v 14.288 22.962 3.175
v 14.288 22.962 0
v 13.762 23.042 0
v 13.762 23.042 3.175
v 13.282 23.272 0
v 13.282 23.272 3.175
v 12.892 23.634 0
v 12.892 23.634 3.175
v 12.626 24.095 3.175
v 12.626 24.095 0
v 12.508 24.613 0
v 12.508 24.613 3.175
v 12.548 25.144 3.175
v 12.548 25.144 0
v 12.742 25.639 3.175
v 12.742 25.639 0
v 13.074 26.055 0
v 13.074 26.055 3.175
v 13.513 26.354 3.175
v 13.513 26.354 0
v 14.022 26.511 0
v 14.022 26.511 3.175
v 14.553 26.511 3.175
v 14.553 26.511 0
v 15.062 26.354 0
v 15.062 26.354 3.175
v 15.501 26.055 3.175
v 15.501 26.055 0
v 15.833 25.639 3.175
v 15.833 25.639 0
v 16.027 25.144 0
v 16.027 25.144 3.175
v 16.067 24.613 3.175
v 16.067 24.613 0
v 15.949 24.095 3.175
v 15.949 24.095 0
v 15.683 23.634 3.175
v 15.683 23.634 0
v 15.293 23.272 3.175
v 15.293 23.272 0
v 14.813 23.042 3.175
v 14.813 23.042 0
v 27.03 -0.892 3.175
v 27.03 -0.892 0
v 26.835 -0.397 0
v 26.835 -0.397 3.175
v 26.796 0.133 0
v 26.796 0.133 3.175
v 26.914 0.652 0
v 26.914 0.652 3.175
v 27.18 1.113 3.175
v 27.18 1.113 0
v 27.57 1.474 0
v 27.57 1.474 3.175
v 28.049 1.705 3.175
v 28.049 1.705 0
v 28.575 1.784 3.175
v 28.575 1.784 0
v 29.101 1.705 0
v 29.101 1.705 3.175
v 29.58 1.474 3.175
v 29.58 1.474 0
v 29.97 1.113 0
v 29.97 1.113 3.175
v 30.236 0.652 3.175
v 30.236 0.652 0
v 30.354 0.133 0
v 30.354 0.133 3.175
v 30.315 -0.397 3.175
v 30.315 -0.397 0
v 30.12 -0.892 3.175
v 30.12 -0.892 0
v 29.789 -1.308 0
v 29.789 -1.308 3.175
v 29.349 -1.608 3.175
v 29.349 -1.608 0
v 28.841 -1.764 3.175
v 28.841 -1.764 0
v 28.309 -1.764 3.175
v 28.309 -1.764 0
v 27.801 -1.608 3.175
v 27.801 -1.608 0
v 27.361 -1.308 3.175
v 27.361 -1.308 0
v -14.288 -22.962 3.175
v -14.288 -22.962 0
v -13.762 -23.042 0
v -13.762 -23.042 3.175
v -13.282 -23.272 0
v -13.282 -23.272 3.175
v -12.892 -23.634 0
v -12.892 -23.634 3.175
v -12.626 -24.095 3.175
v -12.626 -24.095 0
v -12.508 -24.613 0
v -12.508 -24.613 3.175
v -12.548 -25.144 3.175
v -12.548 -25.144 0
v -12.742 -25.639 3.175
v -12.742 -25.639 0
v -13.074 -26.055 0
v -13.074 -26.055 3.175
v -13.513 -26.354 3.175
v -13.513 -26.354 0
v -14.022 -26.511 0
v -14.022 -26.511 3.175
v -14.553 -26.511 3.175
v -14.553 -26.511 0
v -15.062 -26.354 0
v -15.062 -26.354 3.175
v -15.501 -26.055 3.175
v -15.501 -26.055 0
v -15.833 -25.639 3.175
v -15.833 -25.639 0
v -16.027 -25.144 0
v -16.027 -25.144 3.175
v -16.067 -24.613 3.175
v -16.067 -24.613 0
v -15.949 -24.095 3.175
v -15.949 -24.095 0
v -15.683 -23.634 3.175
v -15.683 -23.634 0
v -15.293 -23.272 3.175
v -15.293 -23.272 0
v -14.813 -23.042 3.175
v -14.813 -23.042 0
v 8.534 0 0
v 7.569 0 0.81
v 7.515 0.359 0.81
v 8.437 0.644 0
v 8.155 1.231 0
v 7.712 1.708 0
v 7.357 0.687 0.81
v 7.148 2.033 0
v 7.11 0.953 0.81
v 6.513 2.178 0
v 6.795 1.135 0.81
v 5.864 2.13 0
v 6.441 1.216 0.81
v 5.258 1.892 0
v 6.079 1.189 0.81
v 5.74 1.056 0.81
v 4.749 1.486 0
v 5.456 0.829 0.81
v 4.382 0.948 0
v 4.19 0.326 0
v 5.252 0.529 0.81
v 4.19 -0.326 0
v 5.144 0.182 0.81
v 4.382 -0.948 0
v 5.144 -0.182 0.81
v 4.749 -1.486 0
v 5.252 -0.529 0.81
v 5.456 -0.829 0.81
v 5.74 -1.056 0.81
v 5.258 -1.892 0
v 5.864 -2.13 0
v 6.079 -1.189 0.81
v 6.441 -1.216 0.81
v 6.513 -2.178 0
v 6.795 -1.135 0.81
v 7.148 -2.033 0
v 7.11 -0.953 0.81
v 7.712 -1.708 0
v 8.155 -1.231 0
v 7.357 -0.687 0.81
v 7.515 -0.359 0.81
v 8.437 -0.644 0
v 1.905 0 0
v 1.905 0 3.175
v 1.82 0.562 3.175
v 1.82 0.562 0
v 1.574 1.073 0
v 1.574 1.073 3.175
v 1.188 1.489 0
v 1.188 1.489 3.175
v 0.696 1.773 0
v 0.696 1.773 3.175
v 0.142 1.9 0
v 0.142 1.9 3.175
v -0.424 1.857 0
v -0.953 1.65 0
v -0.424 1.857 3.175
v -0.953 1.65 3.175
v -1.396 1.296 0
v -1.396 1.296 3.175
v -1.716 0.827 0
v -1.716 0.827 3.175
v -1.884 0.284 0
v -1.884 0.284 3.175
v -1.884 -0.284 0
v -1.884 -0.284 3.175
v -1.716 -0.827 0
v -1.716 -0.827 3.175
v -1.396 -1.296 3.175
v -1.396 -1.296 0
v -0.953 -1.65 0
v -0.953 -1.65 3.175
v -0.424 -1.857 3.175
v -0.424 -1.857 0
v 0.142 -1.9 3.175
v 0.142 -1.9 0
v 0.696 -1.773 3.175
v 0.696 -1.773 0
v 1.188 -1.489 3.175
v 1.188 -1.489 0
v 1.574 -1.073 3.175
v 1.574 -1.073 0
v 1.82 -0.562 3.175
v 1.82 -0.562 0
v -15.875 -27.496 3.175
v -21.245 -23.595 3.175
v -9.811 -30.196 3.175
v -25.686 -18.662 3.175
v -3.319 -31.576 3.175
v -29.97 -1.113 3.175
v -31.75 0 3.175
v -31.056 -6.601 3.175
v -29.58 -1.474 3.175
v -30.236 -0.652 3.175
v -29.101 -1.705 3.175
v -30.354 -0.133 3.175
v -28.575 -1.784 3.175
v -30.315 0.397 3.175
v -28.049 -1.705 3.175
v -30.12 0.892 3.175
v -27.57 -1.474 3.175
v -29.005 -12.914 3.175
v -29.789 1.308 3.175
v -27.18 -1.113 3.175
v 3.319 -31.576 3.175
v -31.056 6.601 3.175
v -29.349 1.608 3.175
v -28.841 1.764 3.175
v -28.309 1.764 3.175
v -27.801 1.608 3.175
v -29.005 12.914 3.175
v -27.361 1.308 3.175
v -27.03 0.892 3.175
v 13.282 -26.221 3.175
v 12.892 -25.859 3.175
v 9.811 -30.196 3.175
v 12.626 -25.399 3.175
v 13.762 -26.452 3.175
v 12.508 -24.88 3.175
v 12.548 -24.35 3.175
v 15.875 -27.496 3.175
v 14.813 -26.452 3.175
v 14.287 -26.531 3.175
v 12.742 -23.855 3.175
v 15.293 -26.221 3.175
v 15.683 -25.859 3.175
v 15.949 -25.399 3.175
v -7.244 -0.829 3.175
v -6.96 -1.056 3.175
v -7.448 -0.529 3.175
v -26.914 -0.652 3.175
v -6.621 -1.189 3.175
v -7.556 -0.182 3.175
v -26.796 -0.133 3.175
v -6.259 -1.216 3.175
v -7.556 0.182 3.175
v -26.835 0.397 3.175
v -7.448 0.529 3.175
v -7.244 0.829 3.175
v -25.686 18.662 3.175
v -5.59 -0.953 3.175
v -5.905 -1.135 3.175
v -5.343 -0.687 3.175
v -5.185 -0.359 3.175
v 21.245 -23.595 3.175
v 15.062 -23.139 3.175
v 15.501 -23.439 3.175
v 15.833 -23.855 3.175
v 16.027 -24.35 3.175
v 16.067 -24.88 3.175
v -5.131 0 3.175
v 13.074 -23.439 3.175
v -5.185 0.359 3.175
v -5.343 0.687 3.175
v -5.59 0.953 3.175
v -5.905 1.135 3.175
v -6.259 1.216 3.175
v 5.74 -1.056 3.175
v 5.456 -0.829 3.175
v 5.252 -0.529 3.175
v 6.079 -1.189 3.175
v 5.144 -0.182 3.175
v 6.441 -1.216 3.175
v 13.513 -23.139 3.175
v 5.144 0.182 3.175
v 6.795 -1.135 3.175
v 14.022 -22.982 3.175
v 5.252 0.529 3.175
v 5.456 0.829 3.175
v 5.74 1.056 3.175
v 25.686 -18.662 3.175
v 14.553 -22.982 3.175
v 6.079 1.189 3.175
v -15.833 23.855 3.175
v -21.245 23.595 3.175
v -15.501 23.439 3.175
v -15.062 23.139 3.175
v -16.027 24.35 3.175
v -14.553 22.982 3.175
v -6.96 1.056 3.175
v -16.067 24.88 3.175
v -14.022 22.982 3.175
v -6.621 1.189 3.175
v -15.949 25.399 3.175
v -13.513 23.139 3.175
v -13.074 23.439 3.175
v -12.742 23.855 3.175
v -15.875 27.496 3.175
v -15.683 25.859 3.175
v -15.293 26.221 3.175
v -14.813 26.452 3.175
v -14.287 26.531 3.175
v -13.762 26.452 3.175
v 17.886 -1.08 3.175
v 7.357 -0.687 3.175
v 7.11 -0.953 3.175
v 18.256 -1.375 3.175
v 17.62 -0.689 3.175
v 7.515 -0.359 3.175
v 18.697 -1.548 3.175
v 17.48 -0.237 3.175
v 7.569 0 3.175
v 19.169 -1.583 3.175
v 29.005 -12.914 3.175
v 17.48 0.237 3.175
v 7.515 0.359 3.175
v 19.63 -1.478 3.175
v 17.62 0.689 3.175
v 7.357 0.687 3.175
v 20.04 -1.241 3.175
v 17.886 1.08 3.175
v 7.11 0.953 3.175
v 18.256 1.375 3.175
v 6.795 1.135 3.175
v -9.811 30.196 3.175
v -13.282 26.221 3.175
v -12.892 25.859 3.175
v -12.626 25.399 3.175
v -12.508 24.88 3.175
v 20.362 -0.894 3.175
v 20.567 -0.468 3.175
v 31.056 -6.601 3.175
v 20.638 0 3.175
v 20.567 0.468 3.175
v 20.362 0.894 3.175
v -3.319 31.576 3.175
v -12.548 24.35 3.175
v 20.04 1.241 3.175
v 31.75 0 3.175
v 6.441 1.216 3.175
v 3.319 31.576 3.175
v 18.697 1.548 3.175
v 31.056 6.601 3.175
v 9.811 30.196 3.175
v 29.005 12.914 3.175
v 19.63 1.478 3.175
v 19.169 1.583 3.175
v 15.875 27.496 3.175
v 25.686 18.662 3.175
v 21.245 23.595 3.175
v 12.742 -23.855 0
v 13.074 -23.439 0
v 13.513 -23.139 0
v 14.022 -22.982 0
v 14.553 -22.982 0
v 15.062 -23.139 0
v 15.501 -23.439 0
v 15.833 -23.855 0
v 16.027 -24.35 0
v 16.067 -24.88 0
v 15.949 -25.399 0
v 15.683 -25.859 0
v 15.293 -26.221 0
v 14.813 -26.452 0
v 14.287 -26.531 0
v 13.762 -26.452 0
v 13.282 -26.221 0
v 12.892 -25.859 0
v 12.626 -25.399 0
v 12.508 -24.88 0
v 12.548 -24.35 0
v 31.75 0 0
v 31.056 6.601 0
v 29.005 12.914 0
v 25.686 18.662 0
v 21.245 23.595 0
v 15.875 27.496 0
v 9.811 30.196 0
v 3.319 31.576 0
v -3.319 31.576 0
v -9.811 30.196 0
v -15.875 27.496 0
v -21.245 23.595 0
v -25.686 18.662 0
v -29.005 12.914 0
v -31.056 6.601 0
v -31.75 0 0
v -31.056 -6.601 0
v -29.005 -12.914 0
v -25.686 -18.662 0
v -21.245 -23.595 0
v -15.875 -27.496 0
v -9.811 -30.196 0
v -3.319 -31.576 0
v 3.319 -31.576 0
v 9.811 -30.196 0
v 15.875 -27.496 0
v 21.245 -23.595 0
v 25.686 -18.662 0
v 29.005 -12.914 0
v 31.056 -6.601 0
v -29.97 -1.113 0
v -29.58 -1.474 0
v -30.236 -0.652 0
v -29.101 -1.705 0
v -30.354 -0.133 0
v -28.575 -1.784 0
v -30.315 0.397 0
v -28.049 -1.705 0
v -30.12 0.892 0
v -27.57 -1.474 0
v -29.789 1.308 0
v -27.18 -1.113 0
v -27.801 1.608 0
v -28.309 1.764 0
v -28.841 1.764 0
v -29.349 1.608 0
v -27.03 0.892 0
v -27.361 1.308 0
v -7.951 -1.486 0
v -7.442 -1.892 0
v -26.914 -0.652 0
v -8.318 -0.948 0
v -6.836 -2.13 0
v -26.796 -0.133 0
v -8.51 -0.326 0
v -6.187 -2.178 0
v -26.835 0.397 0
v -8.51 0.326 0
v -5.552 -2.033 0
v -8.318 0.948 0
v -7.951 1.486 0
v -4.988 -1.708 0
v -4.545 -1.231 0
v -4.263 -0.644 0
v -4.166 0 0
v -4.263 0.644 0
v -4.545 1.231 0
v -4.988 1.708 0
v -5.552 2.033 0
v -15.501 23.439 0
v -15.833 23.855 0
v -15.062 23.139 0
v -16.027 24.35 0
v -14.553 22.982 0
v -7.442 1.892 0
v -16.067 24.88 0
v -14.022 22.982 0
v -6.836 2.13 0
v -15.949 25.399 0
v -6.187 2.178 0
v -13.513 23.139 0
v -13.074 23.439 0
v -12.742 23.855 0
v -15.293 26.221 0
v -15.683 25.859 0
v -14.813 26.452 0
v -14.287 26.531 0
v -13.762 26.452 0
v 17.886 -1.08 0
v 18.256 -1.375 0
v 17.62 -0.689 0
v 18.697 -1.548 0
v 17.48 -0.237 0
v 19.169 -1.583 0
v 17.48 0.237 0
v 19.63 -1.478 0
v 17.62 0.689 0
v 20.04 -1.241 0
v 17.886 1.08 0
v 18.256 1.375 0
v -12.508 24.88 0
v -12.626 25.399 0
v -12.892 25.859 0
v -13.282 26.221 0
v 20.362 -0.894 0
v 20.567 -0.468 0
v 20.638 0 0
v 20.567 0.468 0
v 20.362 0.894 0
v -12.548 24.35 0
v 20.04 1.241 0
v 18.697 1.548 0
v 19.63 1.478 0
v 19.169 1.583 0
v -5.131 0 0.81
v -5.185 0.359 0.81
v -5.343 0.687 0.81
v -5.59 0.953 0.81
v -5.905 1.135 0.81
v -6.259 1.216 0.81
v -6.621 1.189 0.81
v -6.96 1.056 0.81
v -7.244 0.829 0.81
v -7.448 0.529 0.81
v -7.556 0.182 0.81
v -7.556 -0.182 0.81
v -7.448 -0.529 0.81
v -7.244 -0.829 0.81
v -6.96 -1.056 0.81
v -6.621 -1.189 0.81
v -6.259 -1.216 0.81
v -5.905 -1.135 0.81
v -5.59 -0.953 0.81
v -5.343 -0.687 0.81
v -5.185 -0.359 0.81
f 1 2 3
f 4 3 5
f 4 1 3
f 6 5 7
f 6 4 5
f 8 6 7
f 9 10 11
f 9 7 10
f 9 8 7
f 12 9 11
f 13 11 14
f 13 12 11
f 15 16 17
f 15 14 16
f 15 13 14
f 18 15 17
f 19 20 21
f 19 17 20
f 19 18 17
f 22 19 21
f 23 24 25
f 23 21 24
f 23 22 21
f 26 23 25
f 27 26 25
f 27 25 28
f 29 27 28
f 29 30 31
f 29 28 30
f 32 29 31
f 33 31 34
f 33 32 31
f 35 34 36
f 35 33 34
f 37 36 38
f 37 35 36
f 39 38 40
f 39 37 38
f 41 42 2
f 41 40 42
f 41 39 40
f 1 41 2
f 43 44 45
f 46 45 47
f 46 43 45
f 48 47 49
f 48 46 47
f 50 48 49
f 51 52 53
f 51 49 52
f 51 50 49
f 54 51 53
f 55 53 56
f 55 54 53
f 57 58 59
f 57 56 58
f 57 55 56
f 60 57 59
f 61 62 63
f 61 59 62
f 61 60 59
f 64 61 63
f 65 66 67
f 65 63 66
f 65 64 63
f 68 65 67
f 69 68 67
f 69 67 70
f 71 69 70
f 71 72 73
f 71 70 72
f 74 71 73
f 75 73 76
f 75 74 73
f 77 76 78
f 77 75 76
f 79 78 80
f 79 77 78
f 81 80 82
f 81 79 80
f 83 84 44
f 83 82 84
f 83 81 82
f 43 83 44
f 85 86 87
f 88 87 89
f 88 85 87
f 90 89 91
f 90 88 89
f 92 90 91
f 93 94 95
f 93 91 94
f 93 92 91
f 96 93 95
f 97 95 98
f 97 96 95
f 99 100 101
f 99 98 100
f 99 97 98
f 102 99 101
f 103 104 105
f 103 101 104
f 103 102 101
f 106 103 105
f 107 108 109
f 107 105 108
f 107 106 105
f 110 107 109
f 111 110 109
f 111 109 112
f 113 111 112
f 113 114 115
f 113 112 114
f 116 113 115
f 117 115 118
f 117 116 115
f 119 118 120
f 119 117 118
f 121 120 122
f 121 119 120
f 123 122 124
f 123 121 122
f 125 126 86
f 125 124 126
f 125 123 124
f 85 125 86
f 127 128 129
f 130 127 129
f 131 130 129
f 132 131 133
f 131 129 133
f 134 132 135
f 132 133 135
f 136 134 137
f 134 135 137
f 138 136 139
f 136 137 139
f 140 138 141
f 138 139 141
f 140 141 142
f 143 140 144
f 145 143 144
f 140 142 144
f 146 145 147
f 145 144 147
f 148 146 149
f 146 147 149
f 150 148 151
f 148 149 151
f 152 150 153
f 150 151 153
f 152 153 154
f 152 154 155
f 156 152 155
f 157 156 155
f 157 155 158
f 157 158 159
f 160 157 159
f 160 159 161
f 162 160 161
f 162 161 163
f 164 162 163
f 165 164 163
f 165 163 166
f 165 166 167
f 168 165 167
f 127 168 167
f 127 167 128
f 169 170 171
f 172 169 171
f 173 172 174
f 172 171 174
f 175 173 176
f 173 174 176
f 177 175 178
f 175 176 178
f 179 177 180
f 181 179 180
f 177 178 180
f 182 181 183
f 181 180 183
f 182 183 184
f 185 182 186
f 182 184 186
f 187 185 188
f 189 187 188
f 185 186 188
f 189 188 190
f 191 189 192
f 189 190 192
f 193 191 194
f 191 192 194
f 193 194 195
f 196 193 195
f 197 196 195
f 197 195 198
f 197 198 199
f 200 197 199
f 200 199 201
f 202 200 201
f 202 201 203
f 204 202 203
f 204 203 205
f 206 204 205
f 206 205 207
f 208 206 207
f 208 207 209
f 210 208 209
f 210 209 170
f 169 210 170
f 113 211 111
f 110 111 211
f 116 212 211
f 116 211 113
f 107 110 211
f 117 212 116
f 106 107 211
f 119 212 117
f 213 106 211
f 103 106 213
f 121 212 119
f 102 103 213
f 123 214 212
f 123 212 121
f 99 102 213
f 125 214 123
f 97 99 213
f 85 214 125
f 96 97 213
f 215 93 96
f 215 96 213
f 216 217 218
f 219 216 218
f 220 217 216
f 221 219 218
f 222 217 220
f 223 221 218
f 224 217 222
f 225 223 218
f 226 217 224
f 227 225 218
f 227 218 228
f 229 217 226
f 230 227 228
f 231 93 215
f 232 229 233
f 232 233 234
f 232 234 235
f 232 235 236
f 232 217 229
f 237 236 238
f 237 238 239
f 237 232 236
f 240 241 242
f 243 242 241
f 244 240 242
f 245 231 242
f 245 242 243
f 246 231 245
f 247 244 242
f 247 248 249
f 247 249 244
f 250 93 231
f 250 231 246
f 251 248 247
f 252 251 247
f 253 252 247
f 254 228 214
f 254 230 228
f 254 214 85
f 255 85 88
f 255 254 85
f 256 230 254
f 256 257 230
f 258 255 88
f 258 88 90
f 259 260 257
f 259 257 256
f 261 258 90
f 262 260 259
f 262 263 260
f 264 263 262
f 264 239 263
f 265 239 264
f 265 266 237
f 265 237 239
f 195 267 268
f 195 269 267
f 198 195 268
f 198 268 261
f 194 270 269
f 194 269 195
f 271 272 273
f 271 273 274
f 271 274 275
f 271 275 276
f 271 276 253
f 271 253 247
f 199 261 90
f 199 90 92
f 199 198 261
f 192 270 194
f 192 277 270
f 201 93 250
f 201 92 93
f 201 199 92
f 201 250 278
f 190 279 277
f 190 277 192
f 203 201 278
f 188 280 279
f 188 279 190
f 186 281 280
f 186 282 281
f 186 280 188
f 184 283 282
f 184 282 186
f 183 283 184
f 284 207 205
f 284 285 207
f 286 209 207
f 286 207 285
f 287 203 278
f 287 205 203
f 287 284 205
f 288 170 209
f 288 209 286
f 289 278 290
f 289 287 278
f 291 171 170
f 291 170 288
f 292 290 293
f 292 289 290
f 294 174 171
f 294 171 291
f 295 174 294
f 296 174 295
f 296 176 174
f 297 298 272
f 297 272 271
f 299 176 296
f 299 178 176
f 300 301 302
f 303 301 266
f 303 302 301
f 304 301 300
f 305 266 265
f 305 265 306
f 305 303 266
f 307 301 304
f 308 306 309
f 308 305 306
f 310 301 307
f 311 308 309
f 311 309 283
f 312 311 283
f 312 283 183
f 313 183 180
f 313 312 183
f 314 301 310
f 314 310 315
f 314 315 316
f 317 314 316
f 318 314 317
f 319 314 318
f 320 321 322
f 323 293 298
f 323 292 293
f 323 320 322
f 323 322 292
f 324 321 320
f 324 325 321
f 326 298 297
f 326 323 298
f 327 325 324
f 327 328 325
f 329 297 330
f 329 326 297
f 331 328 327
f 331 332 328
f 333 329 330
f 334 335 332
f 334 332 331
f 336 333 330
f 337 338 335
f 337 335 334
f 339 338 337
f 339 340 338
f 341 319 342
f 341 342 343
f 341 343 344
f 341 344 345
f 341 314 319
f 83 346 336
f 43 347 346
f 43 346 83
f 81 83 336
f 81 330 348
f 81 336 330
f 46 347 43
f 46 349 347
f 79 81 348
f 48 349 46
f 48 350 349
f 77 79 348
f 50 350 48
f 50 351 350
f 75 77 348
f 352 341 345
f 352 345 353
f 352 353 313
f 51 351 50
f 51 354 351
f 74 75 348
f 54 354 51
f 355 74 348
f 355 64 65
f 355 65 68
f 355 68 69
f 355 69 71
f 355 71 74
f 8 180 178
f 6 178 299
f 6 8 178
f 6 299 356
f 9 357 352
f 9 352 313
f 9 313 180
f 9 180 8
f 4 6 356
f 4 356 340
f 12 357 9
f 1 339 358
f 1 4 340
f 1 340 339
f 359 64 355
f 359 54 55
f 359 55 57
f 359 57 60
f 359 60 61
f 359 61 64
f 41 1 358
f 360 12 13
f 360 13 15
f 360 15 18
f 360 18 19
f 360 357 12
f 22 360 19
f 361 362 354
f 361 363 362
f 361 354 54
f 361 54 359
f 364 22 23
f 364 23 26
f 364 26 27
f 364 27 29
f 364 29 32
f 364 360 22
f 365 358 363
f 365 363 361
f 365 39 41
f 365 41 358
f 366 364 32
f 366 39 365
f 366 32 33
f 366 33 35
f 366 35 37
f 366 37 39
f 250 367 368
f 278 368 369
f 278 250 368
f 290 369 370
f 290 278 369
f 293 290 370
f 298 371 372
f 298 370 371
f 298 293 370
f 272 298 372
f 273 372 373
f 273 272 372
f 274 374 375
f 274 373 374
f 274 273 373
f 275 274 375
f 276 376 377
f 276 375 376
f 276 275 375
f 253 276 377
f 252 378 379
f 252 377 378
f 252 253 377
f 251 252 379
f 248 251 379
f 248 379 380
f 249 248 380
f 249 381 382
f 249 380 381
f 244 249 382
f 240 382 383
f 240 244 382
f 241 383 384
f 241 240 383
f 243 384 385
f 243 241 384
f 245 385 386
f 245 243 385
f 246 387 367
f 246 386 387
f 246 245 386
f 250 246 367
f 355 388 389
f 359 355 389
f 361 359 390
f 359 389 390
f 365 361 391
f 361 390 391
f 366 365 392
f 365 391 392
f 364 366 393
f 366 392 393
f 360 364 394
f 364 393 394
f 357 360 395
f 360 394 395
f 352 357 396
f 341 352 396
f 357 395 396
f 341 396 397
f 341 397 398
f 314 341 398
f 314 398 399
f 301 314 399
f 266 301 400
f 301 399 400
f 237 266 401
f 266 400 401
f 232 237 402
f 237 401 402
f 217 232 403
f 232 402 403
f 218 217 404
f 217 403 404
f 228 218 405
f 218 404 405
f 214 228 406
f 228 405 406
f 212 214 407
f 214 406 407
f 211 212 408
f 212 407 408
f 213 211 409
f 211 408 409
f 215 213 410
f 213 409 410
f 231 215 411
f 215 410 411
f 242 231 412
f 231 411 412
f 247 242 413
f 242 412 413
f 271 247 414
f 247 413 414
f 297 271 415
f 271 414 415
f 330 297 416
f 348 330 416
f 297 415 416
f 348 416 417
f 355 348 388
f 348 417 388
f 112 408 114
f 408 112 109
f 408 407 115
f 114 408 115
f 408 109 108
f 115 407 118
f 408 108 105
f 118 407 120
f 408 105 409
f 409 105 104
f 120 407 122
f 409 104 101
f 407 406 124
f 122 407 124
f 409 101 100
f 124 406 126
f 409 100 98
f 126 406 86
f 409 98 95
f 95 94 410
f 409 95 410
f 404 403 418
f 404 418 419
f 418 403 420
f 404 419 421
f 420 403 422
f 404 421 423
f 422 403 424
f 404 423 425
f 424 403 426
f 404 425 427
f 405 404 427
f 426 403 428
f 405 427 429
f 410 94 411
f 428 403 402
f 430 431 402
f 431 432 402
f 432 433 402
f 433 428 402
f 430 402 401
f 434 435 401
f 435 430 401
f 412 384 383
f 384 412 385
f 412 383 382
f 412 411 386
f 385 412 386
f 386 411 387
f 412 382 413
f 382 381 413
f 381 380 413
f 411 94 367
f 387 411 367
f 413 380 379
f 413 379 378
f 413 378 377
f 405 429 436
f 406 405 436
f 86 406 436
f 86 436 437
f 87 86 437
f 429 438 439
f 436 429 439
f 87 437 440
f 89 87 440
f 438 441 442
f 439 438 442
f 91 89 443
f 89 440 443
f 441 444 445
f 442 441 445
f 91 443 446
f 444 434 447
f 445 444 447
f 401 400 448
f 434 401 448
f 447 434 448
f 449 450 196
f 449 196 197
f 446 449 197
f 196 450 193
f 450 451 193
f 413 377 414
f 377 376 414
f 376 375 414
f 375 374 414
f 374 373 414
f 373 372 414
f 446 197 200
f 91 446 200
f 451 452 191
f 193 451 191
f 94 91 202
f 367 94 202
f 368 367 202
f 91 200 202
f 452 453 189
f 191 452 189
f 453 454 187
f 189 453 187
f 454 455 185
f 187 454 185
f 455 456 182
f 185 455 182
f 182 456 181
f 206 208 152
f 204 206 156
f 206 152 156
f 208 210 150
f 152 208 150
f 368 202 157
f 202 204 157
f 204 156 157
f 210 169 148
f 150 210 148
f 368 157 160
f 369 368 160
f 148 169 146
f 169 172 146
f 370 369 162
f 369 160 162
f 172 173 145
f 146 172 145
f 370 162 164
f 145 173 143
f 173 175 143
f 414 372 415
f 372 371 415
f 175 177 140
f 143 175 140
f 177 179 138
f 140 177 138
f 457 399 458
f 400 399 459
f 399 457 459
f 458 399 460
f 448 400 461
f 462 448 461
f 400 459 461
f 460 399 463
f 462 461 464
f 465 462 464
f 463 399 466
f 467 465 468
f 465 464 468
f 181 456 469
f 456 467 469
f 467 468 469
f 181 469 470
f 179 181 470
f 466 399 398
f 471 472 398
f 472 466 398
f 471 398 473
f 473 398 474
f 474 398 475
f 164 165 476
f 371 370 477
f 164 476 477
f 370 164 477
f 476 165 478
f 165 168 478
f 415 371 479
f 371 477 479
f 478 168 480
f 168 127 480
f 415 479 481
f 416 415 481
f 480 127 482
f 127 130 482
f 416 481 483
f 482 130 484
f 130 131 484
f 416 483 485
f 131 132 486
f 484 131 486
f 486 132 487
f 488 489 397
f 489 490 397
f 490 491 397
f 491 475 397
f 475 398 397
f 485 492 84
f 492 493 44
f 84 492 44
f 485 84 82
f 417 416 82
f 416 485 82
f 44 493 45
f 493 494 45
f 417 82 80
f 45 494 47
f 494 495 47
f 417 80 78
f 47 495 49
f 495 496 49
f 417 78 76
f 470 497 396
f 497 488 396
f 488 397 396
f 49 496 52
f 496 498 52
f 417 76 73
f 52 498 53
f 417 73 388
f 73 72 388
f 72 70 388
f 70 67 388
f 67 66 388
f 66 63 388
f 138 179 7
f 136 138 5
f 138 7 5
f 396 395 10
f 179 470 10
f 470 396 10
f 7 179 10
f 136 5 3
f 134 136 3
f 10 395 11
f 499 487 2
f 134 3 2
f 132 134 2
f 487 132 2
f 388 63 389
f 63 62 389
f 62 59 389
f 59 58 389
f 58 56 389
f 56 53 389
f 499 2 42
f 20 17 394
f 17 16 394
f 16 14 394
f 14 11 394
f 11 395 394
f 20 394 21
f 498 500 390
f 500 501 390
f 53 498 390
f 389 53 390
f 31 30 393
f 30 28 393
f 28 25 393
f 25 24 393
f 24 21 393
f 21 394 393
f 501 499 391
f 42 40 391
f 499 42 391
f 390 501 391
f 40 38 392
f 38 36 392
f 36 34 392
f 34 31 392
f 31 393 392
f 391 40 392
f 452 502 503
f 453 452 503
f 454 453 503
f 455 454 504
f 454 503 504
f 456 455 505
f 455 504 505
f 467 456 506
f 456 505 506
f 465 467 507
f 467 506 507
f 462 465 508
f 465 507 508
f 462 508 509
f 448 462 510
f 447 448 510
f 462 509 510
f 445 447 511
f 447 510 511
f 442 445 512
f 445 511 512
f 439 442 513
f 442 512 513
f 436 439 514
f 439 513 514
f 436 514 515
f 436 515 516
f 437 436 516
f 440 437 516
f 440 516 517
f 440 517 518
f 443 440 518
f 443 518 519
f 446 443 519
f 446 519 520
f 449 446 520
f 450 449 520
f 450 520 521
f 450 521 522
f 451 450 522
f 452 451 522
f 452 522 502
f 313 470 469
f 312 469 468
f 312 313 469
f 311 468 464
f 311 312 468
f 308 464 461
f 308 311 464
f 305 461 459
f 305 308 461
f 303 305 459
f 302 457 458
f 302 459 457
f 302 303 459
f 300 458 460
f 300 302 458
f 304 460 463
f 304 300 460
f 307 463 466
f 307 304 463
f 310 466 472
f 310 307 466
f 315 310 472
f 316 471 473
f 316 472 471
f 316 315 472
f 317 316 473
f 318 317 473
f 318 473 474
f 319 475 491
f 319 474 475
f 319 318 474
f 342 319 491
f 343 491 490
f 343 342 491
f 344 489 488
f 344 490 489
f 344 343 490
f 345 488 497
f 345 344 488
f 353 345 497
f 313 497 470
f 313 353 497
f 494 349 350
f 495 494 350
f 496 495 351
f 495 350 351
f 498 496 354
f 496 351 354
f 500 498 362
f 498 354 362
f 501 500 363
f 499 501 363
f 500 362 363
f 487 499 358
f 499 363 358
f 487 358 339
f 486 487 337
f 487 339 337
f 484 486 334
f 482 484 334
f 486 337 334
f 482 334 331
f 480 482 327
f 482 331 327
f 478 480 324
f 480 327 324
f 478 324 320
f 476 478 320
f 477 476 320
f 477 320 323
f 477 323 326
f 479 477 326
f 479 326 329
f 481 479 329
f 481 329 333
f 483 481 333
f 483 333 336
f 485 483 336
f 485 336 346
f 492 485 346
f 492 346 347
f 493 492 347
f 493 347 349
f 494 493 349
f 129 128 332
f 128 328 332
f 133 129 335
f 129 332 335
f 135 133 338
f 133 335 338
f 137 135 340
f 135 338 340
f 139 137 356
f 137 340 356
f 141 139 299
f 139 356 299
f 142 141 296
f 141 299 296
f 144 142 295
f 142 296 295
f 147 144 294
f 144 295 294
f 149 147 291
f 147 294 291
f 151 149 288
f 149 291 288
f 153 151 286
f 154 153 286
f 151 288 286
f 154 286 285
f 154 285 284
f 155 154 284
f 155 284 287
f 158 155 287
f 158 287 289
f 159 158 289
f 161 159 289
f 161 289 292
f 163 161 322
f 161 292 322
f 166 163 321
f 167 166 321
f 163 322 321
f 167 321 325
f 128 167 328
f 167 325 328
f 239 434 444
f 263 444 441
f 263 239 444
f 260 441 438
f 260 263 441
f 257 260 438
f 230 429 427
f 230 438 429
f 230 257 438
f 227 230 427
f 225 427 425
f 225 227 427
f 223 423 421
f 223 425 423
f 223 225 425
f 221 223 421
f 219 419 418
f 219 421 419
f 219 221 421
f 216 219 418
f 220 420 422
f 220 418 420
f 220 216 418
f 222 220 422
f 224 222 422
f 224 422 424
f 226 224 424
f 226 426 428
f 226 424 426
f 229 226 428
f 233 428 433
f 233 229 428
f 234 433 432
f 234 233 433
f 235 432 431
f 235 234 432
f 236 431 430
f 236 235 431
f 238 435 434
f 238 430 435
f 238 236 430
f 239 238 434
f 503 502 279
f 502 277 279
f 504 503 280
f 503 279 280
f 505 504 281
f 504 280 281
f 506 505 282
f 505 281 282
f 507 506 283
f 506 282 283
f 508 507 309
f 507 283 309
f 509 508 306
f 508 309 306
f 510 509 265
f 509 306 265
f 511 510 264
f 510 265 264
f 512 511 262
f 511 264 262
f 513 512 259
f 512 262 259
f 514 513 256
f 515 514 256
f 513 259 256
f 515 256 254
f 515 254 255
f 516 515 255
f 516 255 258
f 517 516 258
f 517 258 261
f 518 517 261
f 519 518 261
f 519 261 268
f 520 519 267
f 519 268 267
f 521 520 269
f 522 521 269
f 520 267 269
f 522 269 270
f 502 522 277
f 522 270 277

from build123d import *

# Parameters (mm, degrees)
SKETCH1_R                                         = 31.75
BOSS_EXTRUDE1_DEPTH                               = 3.175
CIRPATTERN1_COUNT                                 = 6
SKETCH5_R                                         = 1.905
CUT_EXTRUDE1_DEPTH                                = 4.175
CSK_FOR_2_FLAT_HEAD_MACHINE_SCREW_100_D           = 2.4384
CSK_FOR_2_FLAT_HEAD_MACHINE_SCREW_100_CSINK_D     = 4.3688
CSK_FOR_2_FLAT_HEAD_MACHINE_SCREW_100_CSINK_ANGLE = 100
SKETCH8_R                                         = 1.5875
CUT_EXTRUDE2_DEPTH                                = 4.175


with BuildPart() as part:
    # Sketch1 → Boss-Extrude1 (new body)
    with BuildSketch(Plane.XY):
        Circle(SKETCH1_R)
    extrude(amount=BOSS_EXTRUDE1_DEPTH)

    # Sketch4 → #28 (0.1405) Diameter Hole1 (revolve, cut)
    with BuildSketch(Plane(origin=(14.2875, 24.746675913, 3.175), x_dir=(0, -1, 0), z_dir=(1, 0, 0))):
        Polygon((0, 0), (0, 26.472145646), (1.78435, 25.4), (1.78435, 0), align=None)
    f_28_0_1405_diameter_hole1 = revolve(axis=Axis((14.2875, 24.746675913, 9.525), (0, 0, -1)), mode=Mode.SUBTRACT)

    # CirPattern1: #28 (0.1405) Diameter Hole1 ×6 about axis
    cirpattern1_axis = Axis((0, 0, 0), (0, 0, 1))
    for i in range(1, CIRPATTERN1_COUNT):
        add(f_28_0_1405_diameter_hole1.rotate(cirpattern1_axis, i * 360 / CIRPATTERN1_COUNT), mode=Mode.SUBTRACT)

    # Sketch5 → Cut-Extrude1 (cut, through all)
    with BuildSketch(Plane.XY.offset(3.175)):
        Circle(SKETCH5_R)
    extrude(amount=-CUT_EXTRUDE1_DEPTH, mode=Mode.SUBTRACT)

    # CSK for #2 Flat Head Machine Screw (100)1 (through all)
    with Locations(Plane(origin=(0, 0, 0), x_dir=(-1, 0, 0), z_dir=(0, 0, -1))):
        with Locations((6.35, 0), (-6.35, 0)):
            CounterSinkHole(CSK_FOR_2_FLAT_HEAD_MACHINE_SCREW_100_D / 2, CSK_FOR_2_FLAT_HEAD_MACHINE_SCREW_100_CSINK_D / 2, counter_sink_angle=CSK_FOR_2_FLAT_HEAD_MACHINE_SCREW_100_CSINK_ANGLE)

    # Sketch8 → Cut-Extrude2 (cut, through all)
    with BuildSketch(Plane.XY.offset(3.175)):
        with Locations((19.05, 0)):
            Circle(SKETCH8_R)
    extrude(amount=-CUT_EXTRUDE2_DEPTH, mode=Mode.SUBTRACT)


solid = part.part
